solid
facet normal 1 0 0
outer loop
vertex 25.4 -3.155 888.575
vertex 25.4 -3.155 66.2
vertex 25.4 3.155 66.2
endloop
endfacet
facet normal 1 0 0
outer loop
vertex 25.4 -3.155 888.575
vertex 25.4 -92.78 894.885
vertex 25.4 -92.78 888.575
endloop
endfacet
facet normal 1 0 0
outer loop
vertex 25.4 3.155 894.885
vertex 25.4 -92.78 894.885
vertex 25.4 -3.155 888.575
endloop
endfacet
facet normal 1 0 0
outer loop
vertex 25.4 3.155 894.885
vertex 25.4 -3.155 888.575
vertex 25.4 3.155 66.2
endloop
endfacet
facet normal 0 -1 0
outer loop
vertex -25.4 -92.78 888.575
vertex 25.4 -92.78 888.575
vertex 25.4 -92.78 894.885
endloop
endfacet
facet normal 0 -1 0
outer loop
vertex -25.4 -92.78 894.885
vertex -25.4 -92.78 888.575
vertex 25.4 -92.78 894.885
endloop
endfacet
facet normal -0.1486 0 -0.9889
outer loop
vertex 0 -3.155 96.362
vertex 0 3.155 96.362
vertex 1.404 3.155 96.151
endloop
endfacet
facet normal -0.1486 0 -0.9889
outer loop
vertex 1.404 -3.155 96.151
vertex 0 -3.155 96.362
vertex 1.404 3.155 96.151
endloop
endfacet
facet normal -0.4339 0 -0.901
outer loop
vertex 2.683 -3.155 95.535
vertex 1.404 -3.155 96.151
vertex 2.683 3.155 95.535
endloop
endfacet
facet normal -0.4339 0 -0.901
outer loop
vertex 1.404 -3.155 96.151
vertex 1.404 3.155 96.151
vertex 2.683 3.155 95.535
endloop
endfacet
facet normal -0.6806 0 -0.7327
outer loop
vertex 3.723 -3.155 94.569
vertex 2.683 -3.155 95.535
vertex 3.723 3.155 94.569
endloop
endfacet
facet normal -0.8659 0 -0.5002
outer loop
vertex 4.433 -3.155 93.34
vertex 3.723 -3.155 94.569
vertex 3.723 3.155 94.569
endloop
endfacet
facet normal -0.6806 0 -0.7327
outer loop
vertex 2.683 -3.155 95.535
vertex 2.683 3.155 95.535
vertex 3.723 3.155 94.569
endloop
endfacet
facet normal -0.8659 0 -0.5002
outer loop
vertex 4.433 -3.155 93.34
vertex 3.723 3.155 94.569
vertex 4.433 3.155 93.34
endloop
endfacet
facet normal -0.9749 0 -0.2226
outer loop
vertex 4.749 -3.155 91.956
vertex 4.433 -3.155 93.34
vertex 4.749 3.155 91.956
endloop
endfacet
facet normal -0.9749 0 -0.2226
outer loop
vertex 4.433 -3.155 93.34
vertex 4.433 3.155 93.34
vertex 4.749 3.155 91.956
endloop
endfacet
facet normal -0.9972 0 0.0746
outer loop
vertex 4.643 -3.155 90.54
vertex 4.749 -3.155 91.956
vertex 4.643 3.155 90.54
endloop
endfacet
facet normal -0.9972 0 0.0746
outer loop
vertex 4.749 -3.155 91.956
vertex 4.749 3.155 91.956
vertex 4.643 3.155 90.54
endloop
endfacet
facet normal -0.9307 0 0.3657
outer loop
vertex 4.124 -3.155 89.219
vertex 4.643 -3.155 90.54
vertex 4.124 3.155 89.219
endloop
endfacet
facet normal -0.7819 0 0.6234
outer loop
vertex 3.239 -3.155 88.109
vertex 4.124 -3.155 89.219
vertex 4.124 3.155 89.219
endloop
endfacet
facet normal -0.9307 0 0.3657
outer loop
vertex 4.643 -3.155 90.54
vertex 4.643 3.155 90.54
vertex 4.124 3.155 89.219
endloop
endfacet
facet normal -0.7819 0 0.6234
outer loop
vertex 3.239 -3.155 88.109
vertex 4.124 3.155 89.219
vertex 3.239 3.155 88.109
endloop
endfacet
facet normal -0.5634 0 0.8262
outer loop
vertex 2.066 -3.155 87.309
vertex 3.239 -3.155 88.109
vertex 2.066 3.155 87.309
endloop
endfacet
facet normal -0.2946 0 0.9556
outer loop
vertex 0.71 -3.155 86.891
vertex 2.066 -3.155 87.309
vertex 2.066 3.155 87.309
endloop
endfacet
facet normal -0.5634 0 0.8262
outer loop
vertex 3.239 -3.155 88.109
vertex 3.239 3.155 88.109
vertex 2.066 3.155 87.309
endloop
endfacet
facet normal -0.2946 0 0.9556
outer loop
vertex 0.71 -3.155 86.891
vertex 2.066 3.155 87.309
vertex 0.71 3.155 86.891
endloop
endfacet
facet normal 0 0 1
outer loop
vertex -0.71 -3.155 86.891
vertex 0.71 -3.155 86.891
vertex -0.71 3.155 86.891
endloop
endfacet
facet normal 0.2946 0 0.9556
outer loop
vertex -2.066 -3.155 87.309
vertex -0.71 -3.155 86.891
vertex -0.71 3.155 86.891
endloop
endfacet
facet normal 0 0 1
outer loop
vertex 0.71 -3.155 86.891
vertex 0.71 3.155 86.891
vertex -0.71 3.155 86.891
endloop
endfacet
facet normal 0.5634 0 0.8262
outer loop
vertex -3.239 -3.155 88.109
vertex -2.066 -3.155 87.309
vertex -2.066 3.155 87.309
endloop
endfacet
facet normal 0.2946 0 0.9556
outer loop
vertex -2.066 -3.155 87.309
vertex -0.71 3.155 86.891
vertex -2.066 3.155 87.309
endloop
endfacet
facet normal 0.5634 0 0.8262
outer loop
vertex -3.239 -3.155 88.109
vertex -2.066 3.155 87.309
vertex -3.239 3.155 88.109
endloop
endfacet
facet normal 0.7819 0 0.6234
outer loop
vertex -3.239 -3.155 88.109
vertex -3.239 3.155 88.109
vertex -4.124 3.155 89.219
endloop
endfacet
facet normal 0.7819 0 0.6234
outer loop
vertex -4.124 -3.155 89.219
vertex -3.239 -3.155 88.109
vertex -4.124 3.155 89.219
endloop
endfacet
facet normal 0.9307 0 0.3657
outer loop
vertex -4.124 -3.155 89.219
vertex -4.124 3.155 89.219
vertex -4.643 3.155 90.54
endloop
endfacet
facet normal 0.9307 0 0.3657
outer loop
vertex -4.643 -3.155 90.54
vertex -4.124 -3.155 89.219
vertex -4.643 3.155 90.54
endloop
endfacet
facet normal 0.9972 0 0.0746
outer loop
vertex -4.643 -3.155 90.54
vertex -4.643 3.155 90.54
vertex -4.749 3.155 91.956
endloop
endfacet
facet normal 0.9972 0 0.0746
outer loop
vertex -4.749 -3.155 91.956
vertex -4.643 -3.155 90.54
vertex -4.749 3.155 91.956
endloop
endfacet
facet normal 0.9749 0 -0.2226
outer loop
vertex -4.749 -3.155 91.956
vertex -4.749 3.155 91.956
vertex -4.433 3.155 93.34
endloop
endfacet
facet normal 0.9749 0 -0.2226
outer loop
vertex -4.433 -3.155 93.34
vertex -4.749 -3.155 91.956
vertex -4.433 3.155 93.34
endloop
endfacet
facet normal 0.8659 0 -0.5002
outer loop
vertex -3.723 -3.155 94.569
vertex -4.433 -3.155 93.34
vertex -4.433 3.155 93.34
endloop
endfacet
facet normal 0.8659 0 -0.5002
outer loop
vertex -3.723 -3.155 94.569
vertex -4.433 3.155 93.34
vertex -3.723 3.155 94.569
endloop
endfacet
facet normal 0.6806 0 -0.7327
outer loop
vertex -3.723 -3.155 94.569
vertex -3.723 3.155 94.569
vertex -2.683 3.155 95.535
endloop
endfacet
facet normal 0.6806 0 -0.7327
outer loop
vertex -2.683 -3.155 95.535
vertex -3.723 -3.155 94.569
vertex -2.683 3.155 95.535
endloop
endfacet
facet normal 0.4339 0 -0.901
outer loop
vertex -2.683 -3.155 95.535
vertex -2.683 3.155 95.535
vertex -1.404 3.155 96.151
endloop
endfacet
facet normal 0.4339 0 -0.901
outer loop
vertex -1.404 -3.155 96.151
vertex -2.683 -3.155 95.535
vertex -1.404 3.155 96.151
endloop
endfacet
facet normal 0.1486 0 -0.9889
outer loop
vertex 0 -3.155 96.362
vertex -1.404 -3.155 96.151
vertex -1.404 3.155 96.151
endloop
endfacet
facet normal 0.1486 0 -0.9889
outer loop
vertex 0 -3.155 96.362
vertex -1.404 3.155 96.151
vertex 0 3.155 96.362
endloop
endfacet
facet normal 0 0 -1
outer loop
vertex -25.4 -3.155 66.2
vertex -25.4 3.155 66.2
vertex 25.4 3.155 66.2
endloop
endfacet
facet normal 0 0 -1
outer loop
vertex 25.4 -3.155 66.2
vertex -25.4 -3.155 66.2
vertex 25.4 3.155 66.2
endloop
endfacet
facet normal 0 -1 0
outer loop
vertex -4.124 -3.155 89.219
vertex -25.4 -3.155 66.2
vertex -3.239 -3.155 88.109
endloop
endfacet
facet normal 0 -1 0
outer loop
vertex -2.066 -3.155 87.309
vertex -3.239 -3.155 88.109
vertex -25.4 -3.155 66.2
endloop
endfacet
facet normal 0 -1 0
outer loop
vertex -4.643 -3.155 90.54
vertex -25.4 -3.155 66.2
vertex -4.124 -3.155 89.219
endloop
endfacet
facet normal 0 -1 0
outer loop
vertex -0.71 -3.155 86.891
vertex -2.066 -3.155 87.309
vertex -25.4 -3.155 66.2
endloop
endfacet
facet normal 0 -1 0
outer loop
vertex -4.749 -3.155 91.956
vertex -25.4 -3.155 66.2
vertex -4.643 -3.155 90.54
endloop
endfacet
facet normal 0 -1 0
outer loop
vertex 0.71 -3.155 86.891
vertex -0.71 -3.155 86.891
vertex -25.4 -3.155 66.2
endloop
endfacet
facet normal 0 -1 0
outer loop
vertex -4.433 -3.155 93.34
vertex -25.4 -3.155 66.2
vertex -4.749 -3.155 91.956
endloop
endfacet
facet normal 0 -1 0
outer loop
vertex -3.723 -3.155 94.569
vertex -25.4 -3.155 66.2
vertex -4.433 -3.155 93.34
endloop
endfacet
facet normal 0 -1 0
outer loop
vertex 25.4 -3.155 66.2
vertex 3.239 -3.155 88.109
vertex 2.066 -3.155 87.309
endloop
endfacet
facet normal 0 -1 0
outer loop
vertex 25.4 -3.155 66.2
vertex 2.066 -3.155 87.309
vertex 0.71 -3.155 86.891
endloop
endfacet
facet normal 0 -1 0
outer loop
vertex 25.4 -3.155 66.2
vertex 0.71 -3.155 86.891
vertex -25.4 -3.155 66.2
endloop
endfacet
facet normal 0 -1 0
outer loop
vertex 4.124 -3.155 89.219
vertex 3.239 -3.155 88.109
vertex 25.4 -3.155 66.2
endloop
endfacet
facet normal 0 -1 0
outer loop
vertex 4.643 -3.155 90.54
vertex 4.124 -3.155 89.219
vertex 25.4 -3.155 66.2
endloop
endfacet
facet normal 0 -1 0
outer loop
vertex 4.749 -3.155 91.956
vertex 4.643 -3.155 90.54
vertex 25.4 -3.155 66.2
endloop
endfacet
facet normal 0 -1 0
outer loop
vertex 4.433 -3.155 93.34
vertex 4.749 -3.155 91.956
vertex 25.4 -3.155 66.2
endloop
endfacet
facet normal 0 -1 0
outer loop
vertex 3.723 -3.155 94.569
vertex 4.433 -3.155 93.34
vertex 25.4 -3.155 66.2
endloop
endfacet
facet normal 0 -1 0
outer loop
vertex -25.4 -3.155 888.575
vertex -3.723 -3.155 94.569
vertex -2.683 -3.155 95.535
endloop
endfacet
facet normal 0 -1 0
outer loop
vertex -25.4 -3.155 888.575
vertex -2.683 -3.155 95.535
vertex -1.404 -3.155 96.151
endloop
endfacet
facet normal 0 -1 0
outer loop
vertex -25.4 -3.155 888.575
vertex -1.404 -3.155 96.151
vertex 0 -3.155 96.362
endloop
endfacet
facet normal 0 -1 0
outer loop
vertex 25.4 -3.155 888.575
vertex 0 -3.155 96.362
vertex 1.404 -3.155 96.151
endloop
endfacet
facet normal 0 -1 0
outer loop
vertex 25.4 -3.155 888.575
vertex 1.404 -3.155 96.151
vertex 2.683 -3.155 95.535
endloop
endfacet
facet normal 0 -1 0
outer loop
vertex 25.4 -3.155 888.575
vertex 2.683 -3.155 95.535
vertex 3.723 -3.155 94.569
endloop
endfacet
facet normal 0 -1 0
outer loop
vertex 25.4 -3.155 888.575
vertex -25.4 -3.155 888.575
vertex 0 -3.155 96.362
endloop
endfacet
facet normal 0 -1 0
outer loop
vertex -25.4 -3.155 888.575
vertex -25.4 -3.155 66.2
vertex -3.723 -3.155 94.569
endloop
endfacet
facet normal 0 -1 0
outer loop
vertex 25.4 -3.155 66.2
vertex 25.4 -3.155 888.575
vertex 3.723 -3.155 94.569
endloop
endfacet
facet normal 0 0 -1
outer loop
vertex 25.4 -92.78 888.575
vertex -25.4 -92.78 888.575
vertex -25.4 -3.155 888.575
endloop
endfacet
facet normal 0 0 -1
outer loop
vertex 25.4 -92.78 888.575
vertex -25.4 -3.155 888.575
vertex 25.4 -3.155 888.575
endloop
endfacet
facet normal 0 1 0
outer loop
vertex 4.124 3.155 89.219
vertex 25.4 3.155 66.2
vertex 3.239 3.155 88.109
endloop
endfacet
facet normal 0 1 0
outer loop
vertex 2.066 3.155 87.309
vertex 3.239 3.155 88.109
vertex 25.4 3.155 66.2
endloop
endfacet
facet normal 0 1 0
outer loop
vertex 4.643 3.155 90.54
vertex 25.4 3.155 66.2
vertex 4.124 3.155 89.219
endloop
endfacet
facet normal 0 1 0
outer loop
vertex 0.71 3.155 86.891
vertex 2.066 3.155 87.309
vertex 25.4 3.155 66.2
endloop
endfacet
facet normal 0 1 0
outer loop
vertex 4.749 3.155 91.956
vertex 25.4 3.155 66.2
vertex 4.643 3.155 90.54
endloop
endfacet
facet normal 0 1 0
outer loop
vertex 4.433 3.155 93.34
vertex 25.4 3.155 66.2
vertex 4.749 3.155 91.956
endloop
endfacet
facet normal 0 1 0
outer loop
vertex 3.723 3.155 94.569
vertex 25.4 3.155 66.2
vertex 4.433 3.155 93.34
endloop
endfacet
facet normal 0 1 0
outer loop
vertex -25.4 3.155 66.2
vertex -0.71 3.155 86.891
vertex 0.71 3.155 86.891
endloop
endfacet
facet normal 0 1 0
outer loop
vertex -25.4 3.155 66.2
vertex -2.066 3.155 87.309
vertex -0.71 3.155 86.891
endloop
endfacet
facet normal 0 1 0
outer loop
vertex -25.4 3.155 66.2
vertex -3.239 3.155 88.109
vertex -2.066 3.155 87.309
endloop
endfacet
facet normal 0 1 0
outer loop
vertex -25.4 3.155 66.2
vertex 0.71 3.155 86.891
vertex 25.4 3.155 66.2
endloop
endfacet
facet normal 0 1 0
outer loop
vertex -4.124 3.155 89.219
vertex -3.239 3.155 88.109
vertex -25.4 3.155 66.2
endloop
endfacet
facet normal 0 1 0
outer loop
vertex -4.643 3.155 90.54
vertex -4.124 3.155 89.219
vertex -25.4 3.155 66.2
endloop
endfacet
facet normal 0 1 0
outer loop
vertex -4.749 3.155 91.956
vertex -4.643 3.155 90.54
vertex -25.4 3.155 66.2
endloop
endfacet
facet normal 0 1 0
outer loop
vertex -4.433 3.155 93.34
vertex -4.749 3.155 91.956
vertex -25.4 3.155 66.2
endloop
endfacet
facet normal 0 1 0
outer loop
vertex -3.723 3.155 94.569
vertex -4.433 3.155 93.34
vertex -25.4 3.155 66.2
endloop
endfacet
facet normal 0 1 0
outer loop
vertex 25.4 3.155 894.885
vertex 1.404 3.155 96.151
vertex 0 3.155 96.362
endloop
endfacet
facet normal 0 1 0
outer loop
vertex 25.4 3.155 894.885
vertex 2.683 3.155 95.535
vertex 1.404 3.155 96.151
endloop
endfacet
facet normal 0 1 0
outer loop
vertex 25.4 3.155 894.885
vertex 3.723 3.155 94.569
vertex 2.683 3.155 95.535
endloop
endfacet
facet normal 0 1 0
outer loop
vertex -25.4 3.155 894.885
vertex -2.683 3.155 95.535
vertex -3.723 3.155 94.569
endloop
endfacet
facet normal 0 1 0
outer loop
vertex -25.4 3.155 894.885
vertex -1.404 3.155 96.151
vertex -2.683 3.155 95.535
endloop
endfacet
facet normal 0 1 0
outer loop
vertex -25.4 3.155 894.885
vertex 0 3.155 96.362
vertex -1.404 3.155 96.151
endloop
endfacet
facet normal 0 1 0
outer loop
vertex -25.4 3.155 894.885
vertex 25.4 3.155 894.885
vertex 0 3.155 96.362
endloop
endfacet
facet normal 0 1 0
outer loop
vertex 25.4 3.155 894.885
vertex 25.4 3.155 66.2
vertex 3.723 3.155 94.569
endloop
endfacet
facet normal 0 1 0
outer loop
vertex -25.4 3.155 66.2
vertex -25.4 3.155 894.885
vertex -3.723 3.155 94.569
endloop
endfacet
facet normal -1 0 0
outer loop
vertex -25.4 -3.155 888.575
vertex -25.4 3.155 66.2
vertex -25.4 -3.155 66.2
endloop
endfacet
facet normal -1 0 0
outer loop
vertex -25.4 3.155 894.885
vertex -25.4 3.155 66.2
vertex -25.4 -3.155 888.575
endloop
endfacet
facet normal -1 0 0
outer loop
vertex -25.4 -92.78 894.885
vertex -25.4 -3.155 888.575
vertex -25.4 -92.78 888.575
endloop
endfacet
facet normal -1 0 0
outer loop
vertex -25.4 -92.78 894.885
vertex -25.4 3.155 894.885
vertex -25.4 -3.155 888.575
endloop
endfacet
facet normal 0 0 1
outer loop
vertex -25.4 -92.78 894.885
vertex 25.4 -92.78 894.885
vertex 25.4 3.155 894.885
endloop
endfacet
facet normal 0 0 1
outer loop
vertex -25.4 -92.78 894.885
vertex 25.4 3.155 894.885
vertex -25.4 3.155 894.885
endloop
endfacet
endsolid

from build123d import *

# Parameters (mm, degrees)
CROQUIS1_W            = 50.8
CROQUIS1_H            = 6.31
CROQUIS2_R            = 6.5
CORTAR_EXTRUIR1_DEPTH = 10
CROQUIS5_R            = 6.5
CORTAR_EXTRUIR4_DEPTH = 10
CROQUIS7_W            = 59.2
CROQUIS7_H            = 50.8
CORTAR_EXTRUIR5_DEPTH = 6.31
CROQUIS9_W            = 50.8
CROQUIS9_H            = 66.2
CORTAR_EXTRUIR7_DEPTH = 10
CROQUIS10_R           = 4.7625
CORTAR_EXTRUIR8_DEPTH = 10


with BuildPart() as part:
    # Barrer1: sweep along a curve in space
    with BuildLine() as barrer1_path:
        Line((0, 0, 0), (0, 0, 891.73))
        Line((0, 0, 891.73), (0, -67.38, 891.73))
        Line((0, -67.38, 891.73), (-84.6, -67.38, 891.73))
    # Croquis1 → Barrer1 (sweep)
    with BuildSketch(Plane.XY):
        Rectangle(CROQUIS1_W, CROQUIS1_H)
    sweep(path=barrer1_path.line, transition=Transition.RIGHT)

    # Croquis2 → Cortar-Extruir1 (cut)
    with BuildSketch(Plane(origin=(0, 3.155, 0), x_dir=(1, 0, 0), z_dir=(0, 1, 0))):
        with Locations(Location((0, -16.5, 0), (0, 0, 270))):
            Circle(CROQUIS2_R)
        with Locations(Location((0, -47.5, 0), (0, 0, 270))):
            Circle(CROQUIS2_R)
    extrude(amount=-CORTAR_EXTRUIR1_DEPTH, mode=Mode.SUBTRACT)

    # Croquis5 → Cortar-Extruir4 (cut)
    with BuildSketch(Plane(origin=(0, 0, 888.575), x_dir=(-1, 0, 0), z_dir=(0, 0, -1))):
        with Locations((60, -67.38)):
            Circle(CROQUIS5_R)
    extrude(amount=-CORTAR_EXTRUIR4_DEPTH, mode=Mode.SUBTRACT)

    # Croquis7 → Cortar-Extruir5 (cut)
    with BuildSketch(Plane(origin=(0, 0, 888.575), x_dir=(-1, 0, 0), z_dir=(0, 0, -1))):
        with Locations((55, -67.38)):
            Rectangle(CROQUIS7_W, CROQUIS7_H)
    extrude(amount=-CORTAR_EXTRUIR5_DEPTH, mode=Mode.SUBTRACT)

    # Croquis9 → Cortar-Extruir7 (cut)
    with BuildSketch(Plane(origin=(0, 3.155, 0), x_dir=(1, 0, 0), z_dir=(0, 1, 0))):
        with Locations((0, -33.1)):
            Rectangle(CROQUIS9_W, CROQUIS9_H)
    extrude(amount=-CORTAR_EXTRUIR7_DEPTH, mode=Mode.SUBTRACT)

    # Croquis10 → Cortar-Extruir8 (cut)
    with BuildSketch(Plane(origin=(0, 3.155, 0), x_dir=(1, 0, 0), z_dir=(0, 1, 0))):
        with Locations(Location((0, -91.6, 0), (0, 0, 270))):
            Circle(CROQUIS10_R)
    extrude(amount=-CORTAR_EXTRUIR8_DEPTH, mode=Mode.SUBTRACT)


solid = part.part
